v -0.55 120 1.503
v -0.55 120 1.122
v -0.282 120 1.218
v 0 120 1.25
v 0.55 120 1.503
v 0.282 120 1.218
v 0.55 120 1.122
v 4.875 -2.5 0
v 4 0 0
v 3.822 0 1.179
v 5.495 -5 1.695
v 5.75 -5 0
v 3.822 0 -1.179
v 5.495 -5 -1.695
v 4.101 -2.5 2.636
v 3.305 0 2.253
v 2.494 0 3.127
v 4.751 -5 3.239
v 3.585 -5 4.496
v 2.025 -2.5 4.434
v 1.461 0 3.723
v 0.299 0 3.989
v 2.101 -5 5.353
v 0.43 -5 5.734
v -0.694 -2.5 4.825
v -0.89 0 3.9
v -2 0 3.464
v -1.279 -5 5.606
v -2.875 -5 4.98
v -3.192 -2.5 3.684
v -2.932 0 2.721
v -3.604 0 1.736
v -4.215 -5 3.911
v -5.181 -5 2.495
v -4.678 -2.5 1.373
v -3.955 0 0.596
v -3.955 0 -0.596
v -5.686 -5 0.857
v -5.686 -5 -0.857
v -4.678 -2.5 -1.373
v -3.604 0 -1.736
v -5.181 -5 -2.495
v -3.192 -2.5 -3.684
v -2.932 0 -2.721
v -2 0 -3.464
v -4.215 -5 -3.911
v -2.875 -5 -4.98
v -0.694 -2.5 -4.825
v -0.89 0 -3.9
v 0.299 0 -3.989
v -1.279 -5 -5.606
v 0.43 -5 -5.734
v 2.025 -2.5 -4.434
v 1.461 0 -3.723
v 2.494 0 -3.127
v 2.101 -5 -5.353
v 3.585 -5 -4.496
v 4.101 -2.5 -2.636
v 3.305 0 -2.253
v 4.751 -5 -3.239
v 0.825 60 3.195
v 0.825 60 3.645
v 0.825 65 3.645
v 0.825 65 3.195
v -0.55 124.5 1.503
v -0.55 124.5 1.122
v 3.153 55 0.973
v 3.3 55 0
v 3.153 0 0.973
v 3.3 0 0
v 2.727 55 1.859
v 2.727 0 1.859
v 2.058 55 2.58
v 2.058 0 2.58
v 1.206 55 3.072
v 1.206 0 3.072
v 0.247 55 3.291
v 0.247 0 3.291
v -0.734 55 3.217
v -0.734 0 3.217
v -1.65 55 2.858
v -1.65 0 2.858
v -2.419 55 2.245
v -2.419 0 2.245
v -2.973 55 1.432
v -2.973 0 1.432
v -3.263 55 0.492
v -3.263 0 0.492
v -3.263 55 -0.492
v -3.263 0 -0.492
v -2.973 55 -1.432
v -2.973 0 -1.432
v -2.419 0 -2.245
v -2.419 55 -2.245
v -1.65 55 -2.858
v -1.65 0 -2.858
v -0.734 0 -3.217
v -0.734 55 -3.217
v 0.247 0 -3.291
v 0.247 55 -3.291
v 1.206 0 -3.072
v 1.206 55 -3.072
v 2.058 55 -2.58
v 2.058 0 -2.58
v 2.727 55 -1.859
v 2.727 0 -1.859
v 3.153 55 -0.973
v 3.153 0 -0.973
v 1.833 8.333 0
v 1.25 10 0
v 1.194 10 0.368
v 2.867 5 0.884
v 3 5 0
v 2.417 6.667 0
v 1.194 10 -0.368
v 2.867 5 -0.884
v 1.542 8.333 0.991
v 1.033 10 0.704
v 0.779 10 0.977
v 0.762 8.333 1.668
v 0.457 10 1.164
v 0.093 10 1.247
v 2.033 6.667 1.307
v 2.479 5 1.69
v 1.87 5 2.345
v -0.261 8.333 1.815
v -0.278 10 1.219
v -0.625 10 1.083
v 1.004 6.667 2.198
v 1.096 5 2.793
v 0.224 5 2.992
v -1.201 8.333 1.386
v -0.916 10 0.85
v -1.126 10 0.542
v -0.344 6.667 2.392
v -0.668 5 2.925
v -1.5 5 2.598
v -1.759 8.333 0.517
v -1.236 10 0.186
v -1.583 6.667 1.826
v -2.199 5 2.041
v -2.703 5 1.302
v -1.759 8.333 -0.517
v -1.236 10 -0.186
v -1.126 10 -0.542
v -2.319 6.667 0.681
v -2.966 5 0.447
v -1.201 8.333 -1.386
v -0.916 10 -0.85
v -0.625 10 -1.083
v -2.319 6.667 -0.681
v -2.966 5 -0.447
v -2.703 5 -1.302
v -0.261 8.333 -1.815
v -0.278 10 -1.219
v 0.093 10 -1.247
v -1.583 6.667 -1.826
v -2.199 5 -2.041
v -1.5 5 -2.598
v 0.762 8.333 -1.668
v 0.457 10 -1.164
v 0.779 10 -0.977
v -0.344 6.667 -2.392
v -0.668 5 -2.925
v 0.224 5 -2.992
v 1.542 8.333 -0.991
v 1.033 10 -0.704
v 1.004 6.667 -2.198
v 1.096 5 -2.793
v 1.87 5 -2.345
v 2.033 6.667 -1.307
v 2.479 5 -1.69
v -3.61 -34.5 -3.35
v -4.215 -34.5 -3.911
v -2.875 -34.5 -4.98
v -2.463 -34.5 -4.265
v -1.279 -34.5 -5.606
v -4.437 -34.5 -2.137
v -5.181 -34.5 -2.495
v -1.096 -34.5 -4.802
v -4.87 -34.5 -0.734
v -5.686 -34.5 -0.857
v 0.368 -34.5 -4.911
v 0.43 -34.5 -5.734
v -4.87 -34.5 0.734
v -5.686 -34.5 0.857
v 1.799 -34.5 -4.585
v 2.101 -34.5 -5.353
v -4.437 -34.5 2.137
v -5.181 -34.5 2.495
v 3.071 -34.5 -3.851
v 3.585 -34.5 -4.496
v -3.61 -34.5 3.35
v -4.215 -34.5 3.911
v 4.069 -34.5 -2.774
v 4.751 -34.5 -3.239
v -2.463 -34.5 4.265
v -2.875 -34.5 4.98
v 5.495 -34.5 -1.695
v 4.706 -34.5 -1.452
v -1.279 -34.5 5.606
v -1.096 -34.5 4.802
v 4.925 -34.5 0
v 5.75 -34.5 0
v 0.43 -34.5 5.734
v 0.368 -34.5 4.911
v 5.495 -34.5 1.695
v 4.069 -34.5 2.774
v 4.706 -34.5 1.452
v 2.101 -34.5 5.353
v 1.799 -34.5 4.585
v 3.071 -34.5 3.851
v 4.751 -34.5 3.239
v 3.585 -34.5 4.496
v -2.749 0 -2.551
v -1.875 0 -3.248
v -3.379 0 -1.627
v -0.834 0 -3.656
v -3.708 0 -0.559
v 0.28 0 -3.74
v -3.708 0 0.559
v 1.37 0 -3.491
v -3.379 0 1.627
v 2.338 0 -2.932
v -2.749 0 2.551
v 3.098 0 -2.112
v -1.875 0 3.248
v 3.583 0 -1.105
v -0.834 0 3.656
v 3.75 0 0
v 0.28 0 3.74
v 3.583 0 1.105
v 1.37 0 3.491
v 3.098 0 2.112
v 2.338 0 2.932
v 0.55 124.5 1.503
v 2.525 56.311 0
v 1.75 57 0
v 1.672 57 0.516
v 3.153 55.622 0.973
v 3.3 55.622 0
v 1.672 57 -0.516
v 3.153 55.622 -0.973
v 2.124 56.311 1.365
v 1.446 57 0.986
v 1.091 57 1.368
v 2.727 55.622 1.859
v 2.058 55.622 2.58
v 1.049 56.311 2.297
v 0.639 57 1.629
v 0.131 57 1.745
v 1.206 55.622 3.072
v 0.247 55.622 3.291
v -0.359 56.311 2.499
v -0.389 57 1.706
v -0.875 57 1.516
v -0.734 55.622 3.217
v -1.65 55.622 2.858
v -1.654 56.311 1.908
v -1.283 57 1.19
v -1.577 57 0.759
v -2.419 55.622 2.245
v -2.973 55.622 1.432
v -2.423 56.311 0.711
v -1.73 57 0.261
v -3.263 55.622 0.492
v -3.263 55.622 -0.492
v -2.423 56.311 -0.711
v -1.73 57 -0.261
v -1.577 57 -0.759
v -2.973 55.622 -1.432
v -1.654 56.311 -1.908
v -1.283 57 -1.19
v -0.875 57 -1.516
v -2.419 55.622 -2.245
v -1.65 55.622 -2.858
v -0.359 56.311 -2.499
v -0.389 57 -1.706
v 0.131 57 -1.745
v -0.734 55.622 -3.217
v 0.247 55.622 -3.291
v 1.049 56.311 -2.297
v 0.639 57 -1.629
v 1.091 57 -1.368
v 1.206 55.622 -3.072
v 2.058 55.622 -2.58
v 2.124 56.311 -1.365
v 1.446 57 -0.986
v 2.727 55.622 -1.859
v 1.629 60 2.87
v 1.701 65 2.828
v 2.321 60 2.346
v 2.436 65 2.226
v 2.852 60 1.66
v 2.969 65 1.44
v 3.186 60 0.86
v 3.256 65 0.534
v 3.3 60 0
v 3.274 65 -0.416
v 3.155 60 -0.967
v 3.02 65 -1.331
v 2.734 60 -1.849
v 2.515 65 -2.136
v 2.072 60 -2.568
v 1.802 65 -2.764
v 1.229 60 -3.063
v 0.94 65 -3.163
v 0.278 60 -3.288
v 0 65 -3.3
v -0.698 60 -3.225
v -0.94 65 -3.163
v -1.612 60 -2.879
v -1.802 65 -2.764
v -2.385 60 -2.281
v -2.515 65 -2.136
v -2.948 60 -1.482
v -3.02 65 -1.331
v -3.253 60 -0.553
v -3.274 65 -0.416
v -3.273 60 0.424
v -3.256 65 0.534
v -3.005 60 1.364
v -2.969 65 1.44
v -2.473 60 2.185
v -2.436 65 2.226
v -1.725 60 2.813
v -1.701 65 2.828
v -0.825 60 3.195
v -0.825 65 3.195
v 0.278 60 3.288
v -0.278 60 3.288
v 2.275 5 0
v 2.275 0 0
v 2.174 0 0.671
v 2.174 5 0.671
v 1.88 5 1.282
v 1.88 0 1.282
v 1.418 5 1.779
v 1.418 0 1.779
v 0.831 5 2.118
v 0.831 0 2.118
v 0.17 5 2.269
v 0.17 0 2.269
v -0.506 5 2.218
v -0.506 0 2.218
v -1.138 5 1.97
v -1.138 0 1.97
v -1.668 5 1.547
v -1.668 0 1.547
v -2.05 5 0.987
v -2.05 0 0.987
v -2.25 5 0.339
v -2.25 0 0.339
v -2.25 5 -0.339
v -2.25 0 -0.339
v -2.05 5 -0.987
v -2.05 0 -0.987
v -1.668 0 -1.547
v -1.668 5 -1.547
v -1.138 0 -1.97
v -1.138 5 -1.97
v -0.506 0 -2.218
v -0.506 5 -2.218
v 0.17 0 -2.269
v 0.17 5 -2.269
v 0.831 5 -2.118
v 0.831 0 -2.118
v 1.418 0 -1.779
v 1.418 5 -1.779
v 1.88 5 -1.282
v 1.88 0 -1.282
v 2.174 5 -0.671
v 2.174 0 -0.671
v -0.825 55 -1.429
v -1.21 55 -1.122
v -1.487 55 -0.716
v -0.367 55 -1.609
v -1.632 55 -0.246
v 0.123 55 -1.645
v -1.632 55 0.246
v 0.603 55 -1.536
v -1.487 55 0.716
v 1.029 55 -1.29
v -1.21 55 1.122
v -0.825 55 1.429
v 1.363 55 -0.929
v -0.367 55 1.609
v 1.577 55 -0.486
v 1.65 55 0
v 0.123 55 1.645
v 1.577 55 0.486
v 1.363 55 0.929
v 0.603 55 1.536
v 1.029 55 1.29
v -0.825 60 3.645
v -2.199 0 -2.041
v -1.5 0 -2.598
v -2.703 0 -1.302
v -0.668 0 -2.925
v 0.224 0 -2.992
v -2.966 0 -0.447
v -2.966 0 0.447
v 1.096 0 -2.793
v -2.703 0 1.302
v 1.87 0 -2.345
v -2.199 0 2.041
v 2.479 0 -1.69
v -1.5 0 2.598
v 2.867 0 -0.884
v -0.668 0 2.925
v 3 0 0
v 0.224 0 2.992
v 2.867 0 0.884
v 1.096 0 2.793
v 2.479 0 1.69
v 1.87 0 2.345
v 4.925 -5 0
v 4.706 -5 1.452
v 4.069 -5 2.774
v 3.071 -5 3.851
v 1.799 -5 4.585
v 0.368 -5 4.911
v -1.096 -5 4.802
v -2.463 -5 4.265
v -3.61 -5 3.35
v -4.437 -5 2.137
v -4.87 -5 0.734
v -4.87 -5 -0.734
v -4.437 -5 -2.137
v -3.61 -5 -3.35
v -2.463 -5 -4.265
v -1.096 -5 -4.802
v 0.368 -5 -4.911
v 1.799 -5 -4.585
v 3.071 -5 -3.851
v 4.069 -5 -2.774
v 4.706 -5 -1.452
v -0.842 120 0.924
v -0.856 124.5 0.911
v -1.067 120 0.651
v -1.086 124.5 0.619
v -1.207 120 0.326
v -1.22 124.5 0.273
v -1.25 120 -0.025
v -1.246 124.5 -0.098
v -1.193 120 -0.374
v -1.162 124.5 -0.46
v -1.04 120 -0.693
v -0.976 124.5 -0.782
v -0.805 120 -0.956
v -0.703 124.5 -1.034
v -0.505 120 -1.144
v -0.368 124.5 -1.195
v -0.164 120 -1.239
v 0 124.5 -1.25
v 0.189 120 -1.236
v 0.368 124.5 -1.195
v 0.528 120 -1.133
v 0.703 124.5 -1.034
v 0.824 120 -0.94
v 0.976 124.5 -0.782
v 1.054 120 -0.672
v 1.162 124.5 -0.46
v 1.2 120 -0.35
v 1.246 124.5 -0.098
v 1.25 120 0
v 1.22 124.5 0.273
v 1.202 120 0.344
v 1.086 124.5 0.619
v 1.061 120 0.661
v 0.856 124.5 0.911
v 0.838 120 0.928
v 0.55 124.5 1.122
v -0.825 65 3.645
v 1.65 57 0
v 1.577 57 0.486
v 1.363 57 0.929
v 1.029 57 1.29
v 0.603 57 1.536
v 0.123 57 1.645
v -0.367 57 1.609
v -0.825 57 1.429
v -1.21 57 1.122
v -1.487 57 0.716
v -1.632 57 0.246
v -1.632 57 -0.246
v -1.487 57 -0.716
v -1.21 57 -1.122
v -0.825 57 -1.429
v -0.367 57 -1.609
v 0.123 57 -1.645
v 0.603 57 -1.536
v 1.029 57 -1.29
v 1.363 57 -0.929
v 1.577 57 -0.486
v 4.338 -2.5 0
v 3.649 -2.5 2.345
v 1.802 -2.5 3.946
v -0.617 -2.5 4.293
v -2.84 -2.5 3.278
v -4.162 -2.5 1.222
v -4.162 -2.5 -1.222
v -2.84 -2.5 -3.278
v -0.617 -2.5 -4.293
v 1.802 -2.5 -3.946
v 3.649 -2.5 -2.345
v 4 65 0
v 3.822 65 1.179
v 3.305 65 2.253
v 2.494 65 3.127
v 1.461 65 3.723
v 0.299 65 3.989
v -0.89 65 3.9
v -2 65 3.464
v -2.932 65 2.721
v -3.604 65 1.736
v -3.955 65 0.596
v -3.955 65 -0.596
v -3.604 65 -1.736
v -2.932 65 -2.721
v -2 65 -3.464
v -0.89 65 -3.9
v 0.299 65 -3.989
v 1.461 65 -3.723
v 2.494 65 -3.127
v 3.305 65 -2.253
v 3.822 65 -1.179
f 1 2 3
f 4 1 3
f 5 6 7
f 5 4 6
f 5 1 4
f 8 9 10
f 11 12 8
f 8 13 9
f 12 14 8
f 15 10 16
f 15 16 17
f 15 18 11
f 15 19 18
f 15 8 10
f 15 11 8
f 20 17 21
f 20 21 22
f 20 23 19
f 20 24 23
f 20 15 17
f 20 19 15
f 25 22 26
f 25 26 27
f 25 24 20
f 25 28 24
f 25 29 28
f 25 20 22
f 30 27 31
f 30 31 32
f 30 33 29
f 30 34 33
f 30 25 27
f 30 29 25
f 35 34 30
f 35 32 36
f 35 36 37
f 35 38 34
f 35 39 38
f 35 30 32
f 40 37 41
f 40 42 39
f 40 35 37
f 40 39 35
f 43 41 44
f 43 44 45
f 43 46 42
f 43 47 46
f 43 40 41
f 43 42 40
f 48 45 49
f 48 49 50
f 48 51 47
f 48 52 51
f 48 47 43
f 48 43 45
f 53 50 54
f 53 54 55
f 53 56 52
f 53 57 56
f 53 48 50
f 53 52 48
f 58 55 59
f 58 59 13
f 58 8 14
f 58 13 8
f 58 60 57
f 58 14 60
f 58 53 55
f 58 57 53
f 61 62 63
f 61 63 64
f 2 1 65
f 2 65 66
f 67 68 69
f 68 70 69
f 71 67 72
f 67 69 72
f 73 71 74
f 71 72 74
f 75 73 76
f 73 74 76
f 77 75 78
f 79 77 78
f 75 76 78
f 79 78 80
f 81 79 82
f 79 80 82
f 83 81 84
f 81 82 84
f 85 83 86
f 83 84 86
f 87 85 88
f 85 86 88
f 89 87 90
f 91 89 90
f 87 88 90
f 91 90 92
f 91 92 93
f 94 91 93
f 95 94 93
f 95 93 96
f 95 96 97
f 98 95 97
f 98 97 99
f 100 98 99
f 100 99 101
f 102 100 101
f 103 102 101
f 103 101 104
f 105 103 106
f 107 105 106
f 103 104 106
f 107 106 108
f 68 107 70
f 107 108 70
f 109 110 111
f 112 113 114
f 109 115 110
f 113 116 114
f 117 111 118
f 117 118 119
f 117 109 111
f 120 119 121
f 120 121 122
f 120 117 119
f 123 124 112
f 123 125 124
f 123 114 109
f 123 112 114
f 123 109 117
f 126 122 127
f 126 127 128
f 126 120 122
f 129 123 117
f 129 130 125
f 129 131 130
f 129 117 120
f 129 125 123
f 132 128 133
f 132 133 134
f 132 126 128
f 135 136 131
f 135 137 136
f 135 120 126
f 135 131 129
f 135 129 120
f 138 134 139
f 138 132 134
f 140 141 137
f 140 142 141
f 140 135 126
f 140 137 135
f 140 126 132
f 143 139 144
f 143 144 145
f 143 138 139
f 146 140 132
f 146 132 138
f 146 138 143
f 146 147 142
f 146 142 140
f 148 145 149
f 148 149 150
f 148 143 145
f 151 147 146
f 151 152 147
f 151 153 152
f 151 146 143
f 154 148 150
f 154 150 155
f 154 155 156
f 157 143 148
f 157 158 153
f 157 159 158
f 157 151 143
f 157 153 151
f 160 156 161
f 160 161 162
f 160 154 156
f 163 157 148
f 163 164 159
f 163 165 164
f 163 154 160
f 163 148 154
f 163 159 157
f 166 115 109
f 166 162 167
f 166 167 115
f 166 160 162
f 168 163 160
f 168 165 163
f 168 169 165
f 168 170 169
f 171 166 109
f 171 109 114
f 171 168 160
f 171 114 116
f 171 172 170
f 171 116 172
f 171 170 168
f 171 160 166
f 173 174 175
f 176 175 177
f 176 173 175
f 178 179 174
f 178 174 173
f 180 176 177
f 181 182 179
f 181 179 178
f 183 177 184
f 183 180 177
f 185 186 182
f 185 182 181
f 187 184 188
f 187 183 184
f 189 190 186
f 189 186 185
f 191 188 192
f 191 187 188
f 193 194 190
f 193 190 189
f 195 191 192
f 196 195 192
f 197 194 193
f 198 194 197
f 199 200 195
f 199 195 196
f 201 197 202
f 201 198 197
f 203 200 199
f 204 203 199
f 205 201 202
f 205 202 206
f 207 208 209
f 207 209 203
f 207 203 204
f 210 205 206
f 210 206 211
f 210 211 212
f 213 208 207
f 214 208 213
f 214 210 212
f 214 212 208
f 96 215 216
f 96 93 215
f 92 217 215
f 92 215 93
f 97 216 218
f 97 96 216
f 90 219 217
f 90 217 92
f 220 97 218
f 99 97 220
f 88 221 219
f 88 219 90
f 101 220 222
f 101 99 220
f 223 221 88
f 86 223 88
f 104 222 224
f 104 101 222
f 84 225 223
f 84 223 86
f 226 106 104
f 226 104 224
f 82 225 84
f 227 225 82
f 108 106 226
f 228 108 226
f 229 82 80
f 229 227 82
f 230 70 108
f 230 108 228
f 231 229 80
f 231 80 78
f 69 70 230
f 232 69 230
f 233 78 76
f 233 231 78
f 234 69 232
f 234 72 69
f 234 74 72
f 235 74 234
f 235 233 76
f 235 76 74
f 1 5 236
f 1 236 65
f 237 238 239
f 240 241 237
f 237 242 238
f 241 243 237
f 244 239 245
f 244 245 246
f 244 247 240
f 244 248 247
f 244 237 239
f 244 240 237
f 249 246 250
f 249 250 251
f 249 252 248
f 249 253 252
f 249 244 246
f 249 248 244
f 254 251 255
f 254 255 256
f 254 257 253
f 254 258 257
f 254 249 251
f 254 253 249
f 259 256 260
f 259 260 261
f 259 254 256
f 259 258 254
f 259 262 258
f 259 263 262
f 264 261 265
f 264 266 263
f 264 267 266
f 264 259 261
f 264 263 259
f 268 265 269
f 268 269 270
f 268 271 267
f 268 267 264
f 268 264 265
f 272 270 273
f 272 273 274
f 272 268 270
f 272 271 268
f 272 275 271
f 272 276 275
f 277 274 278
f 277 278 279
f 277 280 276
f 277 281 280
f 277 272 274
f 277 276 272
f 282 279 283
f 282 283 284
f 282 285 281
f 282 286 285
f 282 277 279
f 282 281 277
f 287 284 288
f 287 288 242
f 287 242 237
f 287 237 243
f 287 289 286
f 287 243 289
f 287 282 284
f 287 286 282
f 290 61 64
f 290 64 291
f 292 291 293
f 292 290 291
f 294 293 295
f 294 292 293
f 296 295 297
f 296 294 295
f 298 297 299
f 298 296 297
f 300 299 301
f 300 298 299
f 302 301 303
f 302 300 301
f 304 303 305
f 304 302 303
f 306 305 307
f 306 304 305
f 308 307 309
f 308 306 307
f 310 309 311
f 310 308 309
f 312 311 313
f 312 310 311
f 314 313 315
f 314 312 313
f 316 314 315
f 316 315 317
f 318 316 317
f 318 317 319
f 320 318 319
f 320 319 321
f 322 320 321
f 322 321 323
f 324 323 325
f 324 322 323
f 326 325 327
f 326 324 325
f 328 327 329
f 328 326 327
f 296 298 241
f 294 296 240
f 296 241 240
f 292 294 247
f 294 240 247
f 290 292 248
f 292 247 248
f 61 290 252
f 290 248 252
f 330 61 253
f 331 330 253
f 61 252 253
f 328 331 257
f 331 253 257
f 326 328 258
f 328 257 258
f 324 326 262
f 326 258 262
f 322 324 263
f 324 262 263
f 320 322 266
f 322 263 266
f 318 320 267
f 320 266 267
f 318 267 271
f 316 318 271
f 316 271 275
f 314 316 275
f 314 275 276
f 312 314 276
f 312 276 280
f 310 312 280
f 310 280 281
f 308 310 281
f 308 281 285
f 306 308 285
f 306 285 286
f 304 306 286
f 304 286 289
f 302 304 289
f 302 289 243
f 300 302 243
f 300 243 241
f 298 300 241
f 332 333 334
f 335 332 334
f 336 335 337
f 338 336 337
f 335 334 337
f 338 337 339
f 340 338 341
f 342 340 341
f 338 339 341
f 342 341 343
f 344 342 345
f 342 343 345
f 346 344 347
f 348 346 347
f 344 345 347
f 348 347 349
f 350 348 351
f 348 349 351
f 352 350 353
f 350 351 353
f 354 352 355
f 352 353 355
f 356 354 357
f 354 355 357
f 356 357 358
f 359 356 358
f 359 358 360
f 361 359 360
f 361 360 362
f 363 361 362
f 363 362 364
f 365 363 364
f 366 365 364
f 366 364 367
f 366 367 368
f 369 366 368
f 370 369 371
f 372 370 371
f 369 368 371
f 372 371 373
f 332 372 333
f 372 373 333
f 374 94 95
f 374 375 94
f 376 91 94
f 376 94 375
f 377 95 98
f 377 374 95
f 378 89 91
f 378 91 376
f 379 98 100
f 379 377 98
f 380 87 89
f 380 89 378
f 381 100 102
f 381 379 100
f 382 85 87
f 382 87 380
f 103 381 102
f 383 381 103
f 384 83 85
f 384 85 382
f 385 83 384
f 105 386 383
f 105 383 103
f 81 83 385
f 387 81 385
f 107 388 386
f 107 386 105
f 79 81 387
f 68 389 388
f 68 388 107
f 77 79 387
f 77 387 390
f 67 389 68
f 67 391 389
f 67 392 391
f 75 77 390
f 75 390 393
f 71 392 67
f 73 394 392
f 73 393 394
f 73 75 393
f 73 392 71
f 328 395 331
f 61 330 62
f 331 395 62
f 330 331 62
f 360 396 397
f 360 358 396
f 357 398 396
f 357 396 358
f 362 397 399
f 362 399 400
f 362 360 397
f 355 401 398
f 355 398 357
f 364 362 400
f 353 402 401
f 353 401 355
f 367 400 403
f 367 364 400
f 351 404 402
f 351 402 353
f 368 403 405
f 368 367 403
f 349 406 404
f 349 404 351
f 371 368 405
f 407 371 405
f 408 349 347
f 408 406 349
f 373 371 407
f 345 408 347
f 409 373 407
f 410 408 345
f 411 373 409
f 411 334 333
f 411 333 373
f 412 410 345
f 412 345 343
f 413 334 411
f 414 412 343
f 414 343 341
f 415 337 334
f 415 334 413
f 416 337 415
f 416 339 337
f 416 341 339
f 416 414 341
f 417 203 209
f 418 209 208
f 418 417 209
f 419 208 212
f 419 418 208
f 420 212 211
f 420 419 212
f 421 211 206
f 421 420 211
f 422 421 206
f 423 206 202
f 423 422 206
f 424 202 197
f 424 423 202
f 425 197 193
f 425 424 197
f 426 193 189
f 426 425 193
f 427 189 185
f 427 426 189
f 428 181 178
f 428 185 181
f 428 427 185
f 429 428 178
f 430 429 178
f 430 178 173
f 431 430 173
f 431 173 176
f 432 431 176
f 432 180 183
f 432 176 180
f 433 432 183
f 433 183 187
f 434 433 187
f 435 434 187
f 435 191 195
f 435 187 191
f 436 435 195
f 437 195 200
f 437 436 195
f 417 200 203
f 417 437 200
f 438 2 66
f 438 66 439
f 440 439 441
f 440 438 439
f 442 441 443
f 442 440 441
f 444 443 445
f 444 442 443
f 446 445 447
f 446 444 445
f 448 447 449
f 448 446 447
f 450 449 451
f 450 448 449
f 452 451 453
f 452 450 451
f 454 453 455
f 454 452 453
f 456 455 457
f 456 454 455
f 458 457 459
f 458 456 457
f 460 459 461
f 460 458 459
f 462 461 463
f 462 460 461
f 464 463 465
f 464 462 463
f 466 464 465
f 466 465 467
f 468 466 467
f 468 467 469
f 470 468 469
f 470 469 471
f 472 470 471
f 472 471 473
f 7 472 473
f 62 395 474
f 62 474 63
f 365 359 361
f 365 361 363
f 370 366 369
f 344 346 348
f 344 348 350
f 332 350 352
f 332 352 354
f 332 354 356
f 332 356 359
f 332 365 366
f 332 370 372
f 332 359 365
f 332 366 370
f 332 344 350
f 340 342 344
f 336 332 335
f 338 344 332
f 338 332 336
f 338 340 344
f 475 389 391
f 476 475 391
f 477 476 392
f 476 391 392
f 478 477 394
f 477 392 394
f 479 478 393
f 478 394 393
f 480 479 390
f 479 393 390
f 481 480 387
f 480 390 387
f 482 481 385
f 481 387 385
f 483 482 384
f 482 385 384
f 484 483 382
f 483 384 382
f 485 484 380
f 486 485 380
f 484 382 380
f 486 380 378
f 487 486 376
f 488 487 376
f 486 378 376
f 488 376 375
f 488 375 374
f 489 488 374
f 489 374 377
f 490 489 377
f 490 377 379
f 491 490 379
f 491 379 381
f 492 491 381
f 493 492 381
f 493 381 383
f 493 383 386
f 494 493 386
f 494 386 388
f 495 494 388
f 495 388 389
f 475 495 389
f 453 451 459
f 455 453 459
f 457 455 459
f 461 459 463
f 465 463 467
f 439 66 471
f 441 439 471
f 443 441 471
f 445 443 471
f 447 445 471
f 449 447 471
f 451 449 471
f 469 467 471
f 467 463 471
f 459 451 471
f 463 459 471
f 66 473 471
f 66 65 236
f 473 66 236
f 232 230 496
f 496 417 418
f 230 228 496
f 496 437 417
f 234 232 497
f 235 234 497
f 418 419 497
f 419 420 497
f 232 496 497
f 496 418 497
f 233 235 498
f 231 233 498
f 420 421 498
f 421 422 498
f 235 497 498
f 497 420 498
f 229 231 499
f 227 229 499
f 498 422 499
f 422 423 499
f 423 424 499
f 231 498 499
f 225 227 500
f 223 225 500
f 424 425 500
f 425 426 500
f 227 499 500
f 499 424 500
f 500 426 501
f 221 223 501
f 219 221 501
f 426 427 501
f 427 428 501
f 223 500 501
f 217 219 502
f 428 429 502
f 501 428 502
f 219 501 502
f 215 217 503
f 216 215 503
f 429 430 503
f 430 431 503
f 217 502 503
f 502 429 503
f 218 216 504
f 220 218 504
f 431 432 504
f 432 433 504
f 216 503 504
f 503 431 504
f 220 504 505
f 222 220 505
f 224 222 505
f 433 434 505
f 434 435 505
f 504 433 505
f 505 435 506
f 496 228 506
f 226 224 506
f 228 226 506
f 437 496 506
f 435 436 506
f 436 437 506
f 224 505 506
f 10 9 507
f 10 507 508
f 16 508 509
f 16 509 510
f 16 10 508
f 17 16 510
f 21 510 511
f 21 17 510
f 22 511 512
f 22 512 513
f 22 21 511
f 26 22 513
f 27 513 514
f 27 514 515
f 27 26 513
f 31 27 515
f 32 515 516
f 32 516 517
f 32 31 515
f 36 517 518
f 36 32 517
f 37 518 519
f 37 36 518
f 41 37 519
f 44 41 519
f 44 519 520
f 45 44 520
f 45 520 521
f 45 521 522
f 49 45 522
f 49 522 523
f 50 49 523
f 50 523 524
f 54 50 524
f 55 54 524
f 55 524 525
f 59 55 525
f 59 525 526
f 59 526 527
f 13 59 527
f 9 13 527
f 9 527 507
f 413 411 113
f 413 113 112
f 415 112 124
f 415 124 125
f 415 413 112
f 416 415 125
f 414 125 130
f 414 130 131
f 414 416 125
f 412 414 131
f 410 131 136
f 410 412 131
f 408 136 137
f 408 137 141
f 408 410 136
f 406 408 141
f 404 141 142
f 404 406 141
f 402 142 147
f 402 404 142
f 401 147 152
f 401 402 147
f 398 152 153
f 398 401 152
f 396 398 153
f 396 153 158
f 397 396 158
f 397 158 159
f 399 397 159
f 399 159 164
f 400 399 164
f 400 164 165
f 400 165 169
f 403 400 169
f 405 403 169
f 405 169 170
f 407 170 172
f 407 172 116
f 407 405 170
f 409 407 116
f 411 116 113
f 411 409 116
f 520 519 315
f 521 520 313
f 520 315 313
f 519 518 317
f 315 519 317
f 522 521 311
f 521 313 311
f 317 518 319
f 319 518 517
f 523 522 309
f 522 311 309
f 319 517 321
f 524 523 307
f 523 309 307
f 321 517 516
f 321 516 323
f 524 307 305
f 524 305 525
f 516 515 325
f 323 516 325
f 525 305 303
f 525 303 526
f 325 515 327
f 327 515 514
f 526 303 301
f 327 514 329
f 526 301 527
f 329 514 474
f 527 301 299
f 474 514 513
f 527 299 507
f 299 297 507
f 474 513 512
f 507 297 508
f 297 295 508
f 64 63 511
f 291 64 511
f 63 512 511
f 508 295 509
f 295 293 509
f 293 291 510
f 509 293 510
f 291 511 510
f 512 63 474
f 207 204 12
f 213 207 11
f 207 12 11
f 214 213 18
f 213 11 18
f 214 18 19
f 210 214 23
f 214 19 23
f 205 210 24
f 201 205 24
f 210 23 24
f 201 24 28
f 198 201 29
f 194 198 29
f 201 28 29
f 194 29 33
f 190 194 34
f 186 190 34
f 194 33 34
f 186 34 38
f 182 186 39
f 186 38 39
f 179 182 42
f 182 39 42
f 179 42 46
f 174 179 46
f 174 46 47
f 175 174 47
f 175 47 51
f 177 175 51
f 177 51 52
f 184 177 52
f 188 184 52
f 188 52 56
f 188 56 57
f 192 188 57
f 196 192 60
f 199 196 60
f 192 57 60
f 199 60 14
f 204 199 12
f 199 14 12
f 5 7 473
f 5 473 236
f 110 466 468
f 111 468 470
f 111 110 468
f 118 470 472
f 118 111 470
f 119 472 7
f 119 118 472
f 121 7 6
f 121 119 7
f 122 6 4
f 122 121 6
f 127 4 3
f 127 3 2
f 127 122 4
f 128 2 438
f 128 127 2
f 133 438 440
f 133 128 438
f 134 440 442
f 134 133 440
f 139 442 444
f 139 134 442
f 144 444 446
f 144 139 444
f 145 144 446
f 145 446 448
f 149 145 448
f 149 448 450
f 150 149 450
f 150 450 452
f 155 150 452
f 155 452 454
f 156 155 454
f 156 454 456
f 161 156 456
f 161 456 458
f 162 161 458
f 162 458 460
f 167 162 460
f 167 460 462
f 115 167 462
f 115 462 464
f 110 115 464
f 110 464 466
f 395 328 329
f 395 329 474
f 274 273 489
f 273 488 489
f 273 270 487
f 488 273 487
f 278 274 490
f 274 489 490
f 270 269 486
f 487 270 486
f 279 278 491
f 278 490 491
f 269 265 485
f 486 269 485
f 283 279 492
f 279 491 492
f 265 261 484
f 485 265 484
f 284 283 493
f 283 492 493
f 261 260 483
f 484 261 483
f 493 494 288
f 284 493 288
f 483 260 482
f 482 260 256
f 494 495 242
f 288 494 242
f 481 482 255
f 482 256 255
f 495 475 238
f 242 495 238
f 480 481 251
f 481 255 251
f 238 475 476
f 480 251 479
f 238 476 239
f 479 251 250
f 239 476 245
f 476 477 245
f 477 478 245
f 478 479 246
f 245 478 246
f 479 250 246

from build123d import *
from build123d import SkipClean  # not in build123d's __all__

# Parameters (mm, degrees)
F0_R      = 3
F0_R_2    = 2.275
F1_DEPTH  = 5
F5_R      = 1.25
F3_R      = 3
F7_DEPTH  = 110
F12_DEPTH = 4.5
F13_R     = 4
F13_R_2   = 3.3
F14_DEPTH = 60
F16_R     = 1.75
F18_R     = 4
F20_R     = 1.65
F21_DEPTH = 5
F23_R     = 4
F24_DEPTH = 5
F28_R     = 4
F27_R     = 5.75
F30_R     = 3.75
F31_R     = 4.925
F33_DEPTH = 29.5
F34_DEPTH = 29.6


# Not quite as in the source:
# - after a boolean that leaves OpenCascade's solid faulty, fix() repairs it


with BuildPart() as f1:
    # F0 (on Front) → F1 (new body)
    with BuildSketch(Plane.XZ):
        Circle(F0_R)
        Circle(F0_R_2, mode=Mode.SUBTRACT)
    extrude(amount=-F1_DEPTH)

    # F5 (on offset) → F6 section 0
    with BuildSketch(Plane.XZ.offset(-10)):
        Circle(F5_R)
    # F3 (on offset) → F6 section 1
    with BuildSketch(Plane.XZ.offset(-5)):
        Circle(F3_R)
    loft()

    # F5 (on offset) → F7 (join)
    with BuildSketch(Plane.XZ.offset(-10)):
        Circle(F5_R)
    extrude(amount=-F7_DEPTH)

    # F9 (on offset) → F12 (join)
    with BuildSketch(Plane.XZ.offset(-120)):
        with BuildLine():
            Line((-0.55, 1.5026115235), (-0.55, 1.122497216))
            ThreePointArc((-0.55, 1.122497216), (0, -1.25), (0.55, 1.122497216))
            Line((0.55, 1.122497216), (0.55, 1.5026115235))
            Line((0.55, 1.5026115235), (-0.55, 1.5026115235))
        make_face()
    extrude(amount=-F12_DEPTH)


with BuildPart() as f14:
    # F13 (on Front) → F14 (new body)
    with BuildSketch(Plane.XZ):
        Circle(F13_R)
        Circle(F13_R_2, mode=Mode.SUBTRACT)
    extrude(amount=-F14_DEPTH)

    # F16 (on offset) → F19 section 0
    with BuildSketch(Plane.XZ.offset(-57)):
        Circle(F16_R)
    # F18 (on offset) → F19 section 1
    with BuildSketch(Plane.XZ.offset(-55)):
        Circle(F18_R)
    loft()

    # F20 (on offset) → F21 (cut)
    with BuildSketch(Plane.XZ.offset(-55)):
        Circle(F20_R)
    extrude(amount=-F21_DEPTH, mode=Mode.SUBTRACT)

    # F23 (on offset) → F24 (join)
    with BuildSketch(Plane.XZ.offset(-60)):
        Circle(F23_R)
        with BuildLine():
            ThreePointArc((0.825, 3.1952112606), (0, -3.3), (-0.825, 3.1952112606))
            Line((-0.825, 3.1952112606), (-0.825, 3.6452112606))
            Line((-0.825, 3.6452112606), (0.825, 3.6452112606))
            Line((0.825, 3.6452112606), (0.825, 3.1952112606))
        make_face(mode=Mode.SUBTRACT)
    with SkipClean():  # cleaning this boolean's faces spoils the solid; the shape is the same uncleaned
        extrude(amount=-F24_DEPTH)

    # F28 (on Front) → F29 section 0
    with BuildSketch(Plane.XZ):
        Circle(F28_R)
    # F27 (on offset) → F29 section 1
    with BuildSketch(Plane.XZ.offset(5)):
        Circle(F27_R)
    loft()

    add(f14.part.fix(), mode=Mode.REPLACE)

    # F30 (on Front) → F32 section 0
    with BuildSketch(Plane.XZ):
        Circle(F30_R)
    # F31 (on offset) → F32 section 1
    with BuildSketch(Plane.XZ.offset(5)):
        Circle(F31_R)
    loft(mode=Mode.SUBTRACT)

    # F27 (on offset) → F33 (join)
    with BuildSketch(Plane.XZ.offset(5)):
        Circle(F27_R)
    extrude(amount=F33_DEPTH)

    # F31 (on offset) → F34 (cut)
    with BuildSketch(Plane.XZ.offset(5)):
        Circle(F31_R)
    extrude(amount=F34_DEPTH, mode=Mode.SUBTRACT)


solid = Compound([f1.part, f14.part])
